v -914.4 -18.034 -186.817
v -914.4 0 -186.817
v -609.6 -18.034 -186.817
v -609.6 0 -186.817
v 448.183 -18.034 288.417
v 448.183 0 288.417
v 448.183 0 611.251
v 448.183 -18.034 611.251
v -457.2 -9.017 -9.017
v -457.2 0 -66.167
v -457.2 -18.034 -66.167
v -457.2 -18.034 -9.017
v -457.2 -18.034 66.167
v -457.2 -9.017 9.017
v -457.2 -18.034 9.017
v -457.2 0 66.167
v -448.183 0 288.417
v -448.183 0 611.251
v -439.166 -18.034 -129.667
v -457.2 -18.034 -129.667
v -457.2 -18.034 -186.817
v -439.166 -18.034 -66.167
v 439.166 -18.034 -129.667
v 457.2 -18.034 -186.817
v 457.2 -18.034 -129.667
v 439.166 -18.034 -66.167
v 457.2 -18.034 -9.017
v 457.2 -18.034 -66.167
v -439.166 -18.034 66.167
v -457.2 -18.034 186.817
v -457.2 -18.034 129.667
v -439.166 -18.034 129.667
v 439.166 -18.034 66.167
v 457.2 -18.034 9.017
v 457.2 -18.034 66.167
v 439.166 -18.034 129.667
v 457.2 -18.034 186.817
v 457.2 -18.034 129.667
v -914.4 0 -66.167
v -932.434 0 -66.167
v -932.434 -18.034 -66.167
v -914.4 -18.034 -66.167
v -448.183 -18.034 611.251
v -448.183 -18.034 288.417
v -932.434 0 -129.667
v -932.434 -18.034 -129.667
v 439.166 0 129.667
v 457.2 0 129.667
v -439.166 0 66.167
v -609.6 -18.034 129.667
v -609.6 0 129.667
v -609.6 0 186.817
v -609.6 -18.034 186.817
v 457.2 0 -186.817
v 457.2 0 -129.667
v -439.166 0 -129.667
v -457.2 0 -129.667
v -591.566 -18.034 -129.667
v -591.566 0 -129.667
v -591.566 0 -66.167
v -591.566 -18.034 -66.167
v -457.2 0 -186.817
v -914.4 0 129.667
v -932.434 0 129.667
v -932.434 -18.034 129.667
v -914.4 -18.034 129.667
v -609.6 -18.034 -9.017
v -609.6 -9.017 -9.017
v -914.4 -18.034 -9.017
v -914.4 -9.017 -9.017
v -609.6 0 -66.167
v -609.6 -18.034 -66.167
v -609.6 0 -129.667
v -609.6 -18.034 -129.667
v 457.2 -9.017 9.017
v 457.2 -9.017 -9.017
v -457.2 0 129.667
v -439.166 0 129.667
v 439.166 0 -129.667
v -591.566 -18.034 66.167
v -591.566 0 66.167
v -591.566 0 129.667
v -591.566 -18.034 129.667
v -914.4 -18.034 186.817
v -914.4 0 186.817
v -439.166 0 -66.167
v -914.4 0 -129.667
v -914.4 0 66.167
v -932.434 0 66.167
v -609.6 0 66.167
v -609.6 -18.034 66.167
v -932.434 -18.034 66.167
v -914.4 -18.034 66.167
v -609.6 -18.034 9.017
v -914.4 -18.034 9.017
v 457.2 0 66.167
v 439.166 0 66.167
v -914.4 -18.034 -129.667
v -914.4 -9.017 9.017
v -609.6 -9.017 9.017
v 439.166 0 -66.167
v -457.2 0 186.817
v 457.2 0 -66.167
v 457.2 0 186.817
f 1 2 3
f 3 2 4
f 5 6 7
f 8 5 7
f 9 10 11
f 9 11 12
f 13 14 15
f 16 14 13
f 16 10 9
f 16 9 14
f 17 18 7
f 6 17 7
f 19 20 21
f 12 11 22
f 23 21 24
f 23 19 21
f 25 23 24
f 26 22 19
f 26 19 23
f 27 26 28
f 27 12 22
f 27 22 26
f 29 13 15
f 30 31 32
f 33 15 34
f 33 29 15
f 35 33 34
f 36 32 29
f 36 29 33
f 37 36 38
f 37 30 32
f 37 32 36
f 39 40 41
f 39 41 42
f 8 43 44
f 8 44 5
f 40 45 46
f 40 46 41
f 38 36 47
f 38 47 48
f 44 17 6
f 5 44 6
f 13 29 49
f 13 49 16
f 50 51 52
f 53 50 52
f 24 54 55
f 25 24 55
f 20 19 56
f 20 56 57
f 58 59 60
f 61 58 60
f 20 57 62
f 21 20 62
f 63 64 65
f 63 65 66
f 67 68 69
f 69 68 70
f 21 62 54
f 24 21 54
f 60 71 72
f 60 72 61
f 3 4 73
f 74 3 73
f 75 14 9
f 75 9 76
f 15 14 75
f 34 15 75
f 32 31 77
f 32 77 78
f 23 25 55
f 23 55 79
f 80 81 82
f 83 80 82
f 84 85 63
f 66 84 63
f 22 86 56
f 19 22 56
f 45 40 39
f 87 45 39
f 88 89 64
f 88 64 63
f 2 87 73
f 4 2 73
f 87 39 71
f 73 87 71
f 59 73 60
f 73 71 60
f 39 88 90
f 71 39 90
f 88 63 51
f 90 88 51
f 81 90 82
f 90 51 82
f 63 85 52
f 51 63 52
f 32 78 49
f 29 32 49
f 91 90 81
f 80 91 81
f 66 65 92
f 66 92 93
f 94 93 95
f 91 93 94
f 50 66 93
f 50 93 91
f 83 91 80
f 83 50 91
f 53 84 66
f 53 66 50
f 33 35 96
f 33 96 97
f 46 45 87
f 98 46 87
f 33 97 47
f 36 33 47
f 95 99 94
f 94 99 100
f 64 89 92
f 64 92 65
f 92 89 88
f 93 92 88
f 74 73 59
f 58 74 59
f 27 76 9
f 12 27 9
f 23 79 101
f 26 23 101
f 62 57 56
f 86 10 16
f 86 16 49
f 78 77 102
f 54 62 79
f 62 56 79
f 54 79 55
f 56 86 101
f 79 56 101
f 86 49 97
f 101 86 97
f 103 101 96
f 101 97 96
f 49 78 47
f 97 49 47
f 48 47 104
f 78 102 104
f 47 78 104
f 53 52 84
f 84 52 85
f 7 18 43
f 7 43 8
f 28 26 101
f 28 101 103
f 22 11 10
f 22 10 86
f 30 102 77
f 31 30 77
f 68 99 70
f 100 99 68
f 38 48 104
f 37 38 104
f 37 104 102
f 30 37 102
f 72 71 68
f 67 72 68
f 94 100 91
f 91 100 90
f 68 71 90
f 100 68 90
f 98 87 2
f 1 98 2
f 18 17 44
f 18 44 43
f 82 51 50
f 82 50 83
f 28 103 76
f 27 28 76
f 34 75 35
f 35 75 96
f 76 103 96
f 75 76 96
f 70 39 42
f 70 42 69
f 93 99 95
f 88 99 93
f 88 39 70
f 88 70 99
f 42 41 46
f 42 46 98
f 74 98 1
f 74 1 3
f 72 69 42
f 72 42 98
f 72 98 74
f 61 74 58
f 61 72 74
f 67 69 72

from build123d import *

# Parameters (mm, degrees)
F1_W     = 18.034
F1_H     = 63.5
F2_DEPTH = 18.034
F1_W_2   = 896.366
F1_H_2   = 322.834
F1_W_3   = 304.8
F1_H_3   = 18.034
F3_DEPTH = 9.017
F1_W_4   = 914.4


# Not quite as in the source:
# - a variable given as a bare number and used for a length is read in inches; the dataset says mm whatever the document's units were
# - a feature names something its author has since deleted; it is built from what else it names


with BuildPart() as f2:
    # F1 (on Front) → F2 (new body)
    with BuildSketch(Plane.XZ):
        Polygon((-609.6, 129.667), (-609.6, 186.817), (-914.4, 186.817), (-914.4, 129.667), (-914.4, 66.167), (-914.4, 9.017), (-609.6, 9.017), (-609.6, 66.167), align=None)
        with Locations((-923.417, 97.917)):
            Rectangle(F1_W, F1_H)
        with Locations((-600.583, 97.917)):
            Rectangle(F1_W, F1_H)
    extrude(amount=F2_DEPTH)



with BuildPart() as f2b:
    # F1 (on Front) → F2, piece 2 (new body)
    with BuildSketch(Plane.XZ):
        with Locations((-923.417, -97.917)):
            Rectangle(F1_W, F1_H)
        with Locations((-600.583, -97.917)):
            Rectangle(F1_W, F1_H)
        Polygon((-609.6, -66.167), (-609.6, -9.017), (-914.4, -9.017), (-914.4, -66.167), (-914.4, -129.667), (-914.4, -186.817), (-609.6, -186.817), (-609.6, -129.667), align=None)
    extrude(amount=F2_DEPTH)


with BuildPart() as f2c:
    # F1 (on Front) → F2, piece 3 (new body)
    with BuildSketch(Plane.XZ):
        Polygon((457.2, -9.017), (-457.2, -9.017), (-457.2, -66.167), (-439.166, -66.167), (-439.166, -129.667), (-457.2, -129.667), (-457.2, -186.817), (457.2, -186.817), (457.2, -129.667), (439.166, -129.667), (439.166, -66.167), (457.2, -66.167), align=None)
    extrude(amount=F2_DEPTH)



with BuildPart() as f2d:
    # F1 (on Front) → F2, piece 4 (new body)
    with BuildSketch(Plane.XZ):
        Polygon((457.2, 186.817), (-457.2, 186.817), (-457.2, 129.667), (-439.166, 129.667), (-439.166, 66.167), (-457.2, 66.167), (-457.2, 9.017), (457.2, 9.017), (457.2, 66.167), (439.166, 66.167), (439.166, 129.667), (457.2, 129.667), align=None)
    extrude(amount=F2_DEPTH)


with BuildPart() as f2e:
    # F1 (on Front) → F2, piece 5 (new body)
    with BuildSketch(Plane.XZ):
        with Locations((0, 449.834)):
            Rectangle(F1_W_2, F1_H_2)
    extrude(amount=F2_DEPTH)


with BuildPart() as f2_1:
    add(f2.part)

    add(f2b.part)  # F3 merges F2b
    # F1 (on Front) → F3 (join)
    with BuildSketch(Plane.XZ):
        with Locations((-762, 0)):
            Rectangle(F1_W_3, F1_H_3)
    extrude(amount=F3_DEPTH)


with BuildPart() as f2c_1:
    add(f2c.part)

    add(f2d.part)  # F3#2 merges F2d
    # F1 (on Front) → F3, piece 2 (join)
    with BuildSketch(Plane.XZ):
        Rectangle(F1_W_4, F1_H_3)
    extrude(amount=F3_DEPTH)


solid = Compound([f2e.part, f2_1.part, f2c_1.part])
